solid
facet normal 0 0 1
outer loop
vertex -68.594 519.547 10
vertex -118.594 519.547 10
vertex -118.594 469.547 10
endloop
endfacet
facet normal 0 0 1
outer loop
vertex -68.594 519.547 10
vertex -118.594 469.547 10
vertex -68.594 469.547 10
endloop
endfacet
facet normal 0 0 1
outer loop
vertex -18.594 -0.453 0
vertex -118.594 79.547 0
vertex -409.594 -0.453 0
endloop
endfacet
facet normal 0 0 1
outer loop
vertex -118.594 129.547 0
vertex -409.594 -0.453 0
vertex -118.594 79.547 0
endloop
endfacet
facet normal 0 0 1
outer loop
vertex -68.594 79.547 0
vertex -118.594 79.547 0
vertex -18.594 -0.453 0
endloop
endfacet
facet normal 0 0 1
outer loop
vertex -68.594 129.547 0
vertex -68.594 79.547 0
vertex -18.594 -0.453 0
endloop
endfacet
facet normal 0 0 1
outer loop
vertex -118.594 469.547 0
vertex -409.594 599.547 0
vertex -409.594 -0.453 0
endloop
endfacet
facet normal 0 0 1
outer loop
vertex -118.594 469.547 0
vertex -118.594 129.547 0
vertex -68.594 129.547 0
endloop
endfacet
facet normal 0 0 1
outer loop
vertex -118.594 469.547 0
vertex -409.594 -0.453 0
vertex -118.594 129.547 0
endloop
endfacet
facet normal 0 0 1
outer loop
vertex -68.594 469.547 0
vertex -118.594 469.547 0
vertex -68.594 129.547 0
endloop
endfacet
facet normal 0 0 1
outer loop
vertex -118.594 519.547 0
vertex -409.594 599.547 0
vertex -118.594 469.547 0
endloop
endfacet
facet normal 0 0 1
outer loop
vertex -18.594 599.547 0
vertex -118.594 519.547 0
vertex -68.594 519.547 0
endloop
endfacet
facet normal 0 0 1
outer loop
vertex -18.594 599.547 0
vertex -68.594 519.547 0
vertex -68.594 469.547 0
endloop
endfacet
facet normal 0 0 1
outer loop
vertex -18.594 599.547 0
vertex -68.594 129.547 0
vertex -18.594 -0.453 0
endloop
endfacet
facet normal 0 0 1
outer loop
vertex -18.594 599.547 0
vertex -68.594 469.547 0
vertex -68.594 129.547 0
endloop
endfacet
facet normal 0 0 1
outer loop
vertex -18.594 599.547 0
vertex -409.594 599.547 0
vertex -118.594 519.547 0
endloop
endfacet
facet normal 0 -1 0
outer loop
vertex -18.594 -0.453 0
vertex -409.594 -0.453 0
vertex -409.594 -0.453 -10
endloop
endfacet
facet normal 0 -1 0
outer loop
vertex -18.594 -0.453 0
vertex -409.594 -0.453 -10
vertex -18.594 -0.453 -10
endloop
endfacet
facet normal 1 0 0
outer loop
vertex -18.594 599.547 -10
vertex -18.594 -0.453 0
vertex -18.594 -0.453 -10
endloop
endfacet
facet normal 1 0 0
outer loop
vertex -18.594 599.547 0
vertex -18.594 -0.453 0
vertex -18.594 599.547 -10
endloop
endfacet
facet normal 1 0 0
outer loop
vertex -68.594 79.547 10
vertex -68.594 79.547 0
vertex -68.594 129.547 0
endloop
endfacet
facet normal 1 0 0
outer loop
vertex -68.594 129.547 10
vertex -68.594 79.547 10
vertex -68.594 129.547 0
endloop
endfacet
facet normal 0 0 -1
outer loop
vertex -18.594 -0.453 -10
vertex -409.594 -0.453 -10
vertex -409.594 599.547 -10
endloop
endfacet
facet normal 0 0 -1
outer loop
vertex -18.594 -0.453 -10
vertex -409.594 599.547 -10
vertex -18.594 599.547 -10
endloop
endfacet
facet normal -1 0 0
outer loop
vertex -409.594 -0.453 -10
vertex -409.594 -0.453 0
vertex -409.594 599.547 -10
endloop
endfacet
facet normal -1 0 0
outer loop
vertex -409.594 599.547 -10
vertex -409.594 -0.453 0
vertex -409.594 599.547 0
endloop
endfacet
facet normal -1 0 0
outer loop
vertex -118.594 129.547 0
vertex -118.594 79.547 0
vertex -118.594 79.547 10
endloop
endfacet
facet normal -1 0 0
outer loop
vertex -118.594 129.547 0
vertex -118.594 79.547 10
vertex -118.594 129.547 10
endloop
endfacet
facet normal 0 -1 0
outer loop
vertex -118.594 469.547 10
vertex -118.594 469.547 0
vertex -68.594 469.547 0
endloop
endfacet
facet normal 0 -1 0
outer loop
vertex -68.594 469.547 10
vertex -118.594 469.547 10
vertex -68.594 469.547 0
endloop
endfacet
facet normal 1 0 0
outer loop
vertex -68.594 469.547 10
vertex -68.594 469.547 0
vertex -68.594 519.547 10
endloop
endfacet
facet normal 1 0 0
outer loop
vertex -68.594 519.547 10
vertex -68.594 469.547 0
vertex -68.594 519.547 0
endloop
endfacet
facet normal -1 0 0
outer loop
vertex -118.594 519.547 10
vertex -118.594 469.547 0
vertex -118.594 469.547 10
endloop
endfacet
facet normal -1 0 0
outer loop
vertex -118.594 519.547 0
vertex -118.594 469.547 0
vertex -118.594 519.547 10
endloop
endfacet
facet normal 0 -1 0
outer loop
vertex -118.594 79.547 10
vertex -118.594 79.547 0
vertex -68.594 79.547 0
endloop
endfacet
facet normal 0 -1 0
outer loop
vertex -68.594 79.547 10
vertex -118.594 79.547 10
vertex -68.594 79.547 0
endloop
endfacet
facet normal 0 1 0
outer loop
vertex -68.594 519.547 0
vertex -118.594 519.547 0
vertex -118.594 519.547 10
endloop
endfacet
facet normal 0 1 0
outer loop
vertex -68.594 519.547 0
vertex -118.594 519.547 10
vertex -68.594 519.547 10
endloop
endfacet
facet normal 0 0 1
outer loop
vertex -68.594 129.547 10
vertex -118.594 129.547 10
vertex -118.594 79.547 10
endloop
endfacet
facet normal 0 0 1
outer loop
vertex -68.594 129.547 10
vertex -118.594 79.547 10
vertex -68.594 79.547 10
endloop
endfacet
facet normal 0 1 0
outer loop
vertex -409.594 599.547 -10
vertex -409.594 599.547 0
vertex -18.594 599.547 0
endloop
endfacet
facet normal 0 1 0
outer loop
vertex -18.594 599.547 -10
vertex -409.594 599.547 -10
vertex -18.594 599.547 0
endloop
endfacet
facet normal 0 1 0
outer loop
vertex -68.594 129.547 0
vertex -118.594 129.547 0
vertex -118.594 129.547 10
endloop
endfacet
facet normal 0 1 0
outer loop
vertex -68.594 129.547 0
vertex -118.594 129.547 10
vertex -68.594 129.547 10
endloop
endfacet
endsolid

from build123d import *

# Parameters (mm, degrees)
ESQUISSE1_W        = 391
ESQUISSE1_H        = 600
BOSS_EXTRU_1_DEPTH = 10
ESQUISSE2_W        = 50
ESQUISSE2_H        = 50
BOSS_EXTRU_2_DEPTH = 10


with BuildPart() as part:
    # Esquisse1 → Boss.-Extru.1 (new body)
    with BuildSketch(Plane.XY):
        with Locations((-214.094107131, 299.546616829)):
            Rectangle(ESQUISSE1_W, ESQUISSE1_H)
    extrude(amount=-BOSS_EXTRU_1_DEPTH)

    # Esquisse2 → Boss.-Extru.2 (add)
    with BuildSketch(Plane.XY):
        with Locations((-93.594107131, 494.546616829)):
            Rectangle(ESQUISSE2_W, ESQUISSE2_H)
        with Locations((-93.594107131, 104.546616829)):
            Rectangle(ESQUISSE2_W, ESQUISSE2_H)
    extrude(amount=BOSS_EXTRU_2_DEPTH)


solid = part.part
